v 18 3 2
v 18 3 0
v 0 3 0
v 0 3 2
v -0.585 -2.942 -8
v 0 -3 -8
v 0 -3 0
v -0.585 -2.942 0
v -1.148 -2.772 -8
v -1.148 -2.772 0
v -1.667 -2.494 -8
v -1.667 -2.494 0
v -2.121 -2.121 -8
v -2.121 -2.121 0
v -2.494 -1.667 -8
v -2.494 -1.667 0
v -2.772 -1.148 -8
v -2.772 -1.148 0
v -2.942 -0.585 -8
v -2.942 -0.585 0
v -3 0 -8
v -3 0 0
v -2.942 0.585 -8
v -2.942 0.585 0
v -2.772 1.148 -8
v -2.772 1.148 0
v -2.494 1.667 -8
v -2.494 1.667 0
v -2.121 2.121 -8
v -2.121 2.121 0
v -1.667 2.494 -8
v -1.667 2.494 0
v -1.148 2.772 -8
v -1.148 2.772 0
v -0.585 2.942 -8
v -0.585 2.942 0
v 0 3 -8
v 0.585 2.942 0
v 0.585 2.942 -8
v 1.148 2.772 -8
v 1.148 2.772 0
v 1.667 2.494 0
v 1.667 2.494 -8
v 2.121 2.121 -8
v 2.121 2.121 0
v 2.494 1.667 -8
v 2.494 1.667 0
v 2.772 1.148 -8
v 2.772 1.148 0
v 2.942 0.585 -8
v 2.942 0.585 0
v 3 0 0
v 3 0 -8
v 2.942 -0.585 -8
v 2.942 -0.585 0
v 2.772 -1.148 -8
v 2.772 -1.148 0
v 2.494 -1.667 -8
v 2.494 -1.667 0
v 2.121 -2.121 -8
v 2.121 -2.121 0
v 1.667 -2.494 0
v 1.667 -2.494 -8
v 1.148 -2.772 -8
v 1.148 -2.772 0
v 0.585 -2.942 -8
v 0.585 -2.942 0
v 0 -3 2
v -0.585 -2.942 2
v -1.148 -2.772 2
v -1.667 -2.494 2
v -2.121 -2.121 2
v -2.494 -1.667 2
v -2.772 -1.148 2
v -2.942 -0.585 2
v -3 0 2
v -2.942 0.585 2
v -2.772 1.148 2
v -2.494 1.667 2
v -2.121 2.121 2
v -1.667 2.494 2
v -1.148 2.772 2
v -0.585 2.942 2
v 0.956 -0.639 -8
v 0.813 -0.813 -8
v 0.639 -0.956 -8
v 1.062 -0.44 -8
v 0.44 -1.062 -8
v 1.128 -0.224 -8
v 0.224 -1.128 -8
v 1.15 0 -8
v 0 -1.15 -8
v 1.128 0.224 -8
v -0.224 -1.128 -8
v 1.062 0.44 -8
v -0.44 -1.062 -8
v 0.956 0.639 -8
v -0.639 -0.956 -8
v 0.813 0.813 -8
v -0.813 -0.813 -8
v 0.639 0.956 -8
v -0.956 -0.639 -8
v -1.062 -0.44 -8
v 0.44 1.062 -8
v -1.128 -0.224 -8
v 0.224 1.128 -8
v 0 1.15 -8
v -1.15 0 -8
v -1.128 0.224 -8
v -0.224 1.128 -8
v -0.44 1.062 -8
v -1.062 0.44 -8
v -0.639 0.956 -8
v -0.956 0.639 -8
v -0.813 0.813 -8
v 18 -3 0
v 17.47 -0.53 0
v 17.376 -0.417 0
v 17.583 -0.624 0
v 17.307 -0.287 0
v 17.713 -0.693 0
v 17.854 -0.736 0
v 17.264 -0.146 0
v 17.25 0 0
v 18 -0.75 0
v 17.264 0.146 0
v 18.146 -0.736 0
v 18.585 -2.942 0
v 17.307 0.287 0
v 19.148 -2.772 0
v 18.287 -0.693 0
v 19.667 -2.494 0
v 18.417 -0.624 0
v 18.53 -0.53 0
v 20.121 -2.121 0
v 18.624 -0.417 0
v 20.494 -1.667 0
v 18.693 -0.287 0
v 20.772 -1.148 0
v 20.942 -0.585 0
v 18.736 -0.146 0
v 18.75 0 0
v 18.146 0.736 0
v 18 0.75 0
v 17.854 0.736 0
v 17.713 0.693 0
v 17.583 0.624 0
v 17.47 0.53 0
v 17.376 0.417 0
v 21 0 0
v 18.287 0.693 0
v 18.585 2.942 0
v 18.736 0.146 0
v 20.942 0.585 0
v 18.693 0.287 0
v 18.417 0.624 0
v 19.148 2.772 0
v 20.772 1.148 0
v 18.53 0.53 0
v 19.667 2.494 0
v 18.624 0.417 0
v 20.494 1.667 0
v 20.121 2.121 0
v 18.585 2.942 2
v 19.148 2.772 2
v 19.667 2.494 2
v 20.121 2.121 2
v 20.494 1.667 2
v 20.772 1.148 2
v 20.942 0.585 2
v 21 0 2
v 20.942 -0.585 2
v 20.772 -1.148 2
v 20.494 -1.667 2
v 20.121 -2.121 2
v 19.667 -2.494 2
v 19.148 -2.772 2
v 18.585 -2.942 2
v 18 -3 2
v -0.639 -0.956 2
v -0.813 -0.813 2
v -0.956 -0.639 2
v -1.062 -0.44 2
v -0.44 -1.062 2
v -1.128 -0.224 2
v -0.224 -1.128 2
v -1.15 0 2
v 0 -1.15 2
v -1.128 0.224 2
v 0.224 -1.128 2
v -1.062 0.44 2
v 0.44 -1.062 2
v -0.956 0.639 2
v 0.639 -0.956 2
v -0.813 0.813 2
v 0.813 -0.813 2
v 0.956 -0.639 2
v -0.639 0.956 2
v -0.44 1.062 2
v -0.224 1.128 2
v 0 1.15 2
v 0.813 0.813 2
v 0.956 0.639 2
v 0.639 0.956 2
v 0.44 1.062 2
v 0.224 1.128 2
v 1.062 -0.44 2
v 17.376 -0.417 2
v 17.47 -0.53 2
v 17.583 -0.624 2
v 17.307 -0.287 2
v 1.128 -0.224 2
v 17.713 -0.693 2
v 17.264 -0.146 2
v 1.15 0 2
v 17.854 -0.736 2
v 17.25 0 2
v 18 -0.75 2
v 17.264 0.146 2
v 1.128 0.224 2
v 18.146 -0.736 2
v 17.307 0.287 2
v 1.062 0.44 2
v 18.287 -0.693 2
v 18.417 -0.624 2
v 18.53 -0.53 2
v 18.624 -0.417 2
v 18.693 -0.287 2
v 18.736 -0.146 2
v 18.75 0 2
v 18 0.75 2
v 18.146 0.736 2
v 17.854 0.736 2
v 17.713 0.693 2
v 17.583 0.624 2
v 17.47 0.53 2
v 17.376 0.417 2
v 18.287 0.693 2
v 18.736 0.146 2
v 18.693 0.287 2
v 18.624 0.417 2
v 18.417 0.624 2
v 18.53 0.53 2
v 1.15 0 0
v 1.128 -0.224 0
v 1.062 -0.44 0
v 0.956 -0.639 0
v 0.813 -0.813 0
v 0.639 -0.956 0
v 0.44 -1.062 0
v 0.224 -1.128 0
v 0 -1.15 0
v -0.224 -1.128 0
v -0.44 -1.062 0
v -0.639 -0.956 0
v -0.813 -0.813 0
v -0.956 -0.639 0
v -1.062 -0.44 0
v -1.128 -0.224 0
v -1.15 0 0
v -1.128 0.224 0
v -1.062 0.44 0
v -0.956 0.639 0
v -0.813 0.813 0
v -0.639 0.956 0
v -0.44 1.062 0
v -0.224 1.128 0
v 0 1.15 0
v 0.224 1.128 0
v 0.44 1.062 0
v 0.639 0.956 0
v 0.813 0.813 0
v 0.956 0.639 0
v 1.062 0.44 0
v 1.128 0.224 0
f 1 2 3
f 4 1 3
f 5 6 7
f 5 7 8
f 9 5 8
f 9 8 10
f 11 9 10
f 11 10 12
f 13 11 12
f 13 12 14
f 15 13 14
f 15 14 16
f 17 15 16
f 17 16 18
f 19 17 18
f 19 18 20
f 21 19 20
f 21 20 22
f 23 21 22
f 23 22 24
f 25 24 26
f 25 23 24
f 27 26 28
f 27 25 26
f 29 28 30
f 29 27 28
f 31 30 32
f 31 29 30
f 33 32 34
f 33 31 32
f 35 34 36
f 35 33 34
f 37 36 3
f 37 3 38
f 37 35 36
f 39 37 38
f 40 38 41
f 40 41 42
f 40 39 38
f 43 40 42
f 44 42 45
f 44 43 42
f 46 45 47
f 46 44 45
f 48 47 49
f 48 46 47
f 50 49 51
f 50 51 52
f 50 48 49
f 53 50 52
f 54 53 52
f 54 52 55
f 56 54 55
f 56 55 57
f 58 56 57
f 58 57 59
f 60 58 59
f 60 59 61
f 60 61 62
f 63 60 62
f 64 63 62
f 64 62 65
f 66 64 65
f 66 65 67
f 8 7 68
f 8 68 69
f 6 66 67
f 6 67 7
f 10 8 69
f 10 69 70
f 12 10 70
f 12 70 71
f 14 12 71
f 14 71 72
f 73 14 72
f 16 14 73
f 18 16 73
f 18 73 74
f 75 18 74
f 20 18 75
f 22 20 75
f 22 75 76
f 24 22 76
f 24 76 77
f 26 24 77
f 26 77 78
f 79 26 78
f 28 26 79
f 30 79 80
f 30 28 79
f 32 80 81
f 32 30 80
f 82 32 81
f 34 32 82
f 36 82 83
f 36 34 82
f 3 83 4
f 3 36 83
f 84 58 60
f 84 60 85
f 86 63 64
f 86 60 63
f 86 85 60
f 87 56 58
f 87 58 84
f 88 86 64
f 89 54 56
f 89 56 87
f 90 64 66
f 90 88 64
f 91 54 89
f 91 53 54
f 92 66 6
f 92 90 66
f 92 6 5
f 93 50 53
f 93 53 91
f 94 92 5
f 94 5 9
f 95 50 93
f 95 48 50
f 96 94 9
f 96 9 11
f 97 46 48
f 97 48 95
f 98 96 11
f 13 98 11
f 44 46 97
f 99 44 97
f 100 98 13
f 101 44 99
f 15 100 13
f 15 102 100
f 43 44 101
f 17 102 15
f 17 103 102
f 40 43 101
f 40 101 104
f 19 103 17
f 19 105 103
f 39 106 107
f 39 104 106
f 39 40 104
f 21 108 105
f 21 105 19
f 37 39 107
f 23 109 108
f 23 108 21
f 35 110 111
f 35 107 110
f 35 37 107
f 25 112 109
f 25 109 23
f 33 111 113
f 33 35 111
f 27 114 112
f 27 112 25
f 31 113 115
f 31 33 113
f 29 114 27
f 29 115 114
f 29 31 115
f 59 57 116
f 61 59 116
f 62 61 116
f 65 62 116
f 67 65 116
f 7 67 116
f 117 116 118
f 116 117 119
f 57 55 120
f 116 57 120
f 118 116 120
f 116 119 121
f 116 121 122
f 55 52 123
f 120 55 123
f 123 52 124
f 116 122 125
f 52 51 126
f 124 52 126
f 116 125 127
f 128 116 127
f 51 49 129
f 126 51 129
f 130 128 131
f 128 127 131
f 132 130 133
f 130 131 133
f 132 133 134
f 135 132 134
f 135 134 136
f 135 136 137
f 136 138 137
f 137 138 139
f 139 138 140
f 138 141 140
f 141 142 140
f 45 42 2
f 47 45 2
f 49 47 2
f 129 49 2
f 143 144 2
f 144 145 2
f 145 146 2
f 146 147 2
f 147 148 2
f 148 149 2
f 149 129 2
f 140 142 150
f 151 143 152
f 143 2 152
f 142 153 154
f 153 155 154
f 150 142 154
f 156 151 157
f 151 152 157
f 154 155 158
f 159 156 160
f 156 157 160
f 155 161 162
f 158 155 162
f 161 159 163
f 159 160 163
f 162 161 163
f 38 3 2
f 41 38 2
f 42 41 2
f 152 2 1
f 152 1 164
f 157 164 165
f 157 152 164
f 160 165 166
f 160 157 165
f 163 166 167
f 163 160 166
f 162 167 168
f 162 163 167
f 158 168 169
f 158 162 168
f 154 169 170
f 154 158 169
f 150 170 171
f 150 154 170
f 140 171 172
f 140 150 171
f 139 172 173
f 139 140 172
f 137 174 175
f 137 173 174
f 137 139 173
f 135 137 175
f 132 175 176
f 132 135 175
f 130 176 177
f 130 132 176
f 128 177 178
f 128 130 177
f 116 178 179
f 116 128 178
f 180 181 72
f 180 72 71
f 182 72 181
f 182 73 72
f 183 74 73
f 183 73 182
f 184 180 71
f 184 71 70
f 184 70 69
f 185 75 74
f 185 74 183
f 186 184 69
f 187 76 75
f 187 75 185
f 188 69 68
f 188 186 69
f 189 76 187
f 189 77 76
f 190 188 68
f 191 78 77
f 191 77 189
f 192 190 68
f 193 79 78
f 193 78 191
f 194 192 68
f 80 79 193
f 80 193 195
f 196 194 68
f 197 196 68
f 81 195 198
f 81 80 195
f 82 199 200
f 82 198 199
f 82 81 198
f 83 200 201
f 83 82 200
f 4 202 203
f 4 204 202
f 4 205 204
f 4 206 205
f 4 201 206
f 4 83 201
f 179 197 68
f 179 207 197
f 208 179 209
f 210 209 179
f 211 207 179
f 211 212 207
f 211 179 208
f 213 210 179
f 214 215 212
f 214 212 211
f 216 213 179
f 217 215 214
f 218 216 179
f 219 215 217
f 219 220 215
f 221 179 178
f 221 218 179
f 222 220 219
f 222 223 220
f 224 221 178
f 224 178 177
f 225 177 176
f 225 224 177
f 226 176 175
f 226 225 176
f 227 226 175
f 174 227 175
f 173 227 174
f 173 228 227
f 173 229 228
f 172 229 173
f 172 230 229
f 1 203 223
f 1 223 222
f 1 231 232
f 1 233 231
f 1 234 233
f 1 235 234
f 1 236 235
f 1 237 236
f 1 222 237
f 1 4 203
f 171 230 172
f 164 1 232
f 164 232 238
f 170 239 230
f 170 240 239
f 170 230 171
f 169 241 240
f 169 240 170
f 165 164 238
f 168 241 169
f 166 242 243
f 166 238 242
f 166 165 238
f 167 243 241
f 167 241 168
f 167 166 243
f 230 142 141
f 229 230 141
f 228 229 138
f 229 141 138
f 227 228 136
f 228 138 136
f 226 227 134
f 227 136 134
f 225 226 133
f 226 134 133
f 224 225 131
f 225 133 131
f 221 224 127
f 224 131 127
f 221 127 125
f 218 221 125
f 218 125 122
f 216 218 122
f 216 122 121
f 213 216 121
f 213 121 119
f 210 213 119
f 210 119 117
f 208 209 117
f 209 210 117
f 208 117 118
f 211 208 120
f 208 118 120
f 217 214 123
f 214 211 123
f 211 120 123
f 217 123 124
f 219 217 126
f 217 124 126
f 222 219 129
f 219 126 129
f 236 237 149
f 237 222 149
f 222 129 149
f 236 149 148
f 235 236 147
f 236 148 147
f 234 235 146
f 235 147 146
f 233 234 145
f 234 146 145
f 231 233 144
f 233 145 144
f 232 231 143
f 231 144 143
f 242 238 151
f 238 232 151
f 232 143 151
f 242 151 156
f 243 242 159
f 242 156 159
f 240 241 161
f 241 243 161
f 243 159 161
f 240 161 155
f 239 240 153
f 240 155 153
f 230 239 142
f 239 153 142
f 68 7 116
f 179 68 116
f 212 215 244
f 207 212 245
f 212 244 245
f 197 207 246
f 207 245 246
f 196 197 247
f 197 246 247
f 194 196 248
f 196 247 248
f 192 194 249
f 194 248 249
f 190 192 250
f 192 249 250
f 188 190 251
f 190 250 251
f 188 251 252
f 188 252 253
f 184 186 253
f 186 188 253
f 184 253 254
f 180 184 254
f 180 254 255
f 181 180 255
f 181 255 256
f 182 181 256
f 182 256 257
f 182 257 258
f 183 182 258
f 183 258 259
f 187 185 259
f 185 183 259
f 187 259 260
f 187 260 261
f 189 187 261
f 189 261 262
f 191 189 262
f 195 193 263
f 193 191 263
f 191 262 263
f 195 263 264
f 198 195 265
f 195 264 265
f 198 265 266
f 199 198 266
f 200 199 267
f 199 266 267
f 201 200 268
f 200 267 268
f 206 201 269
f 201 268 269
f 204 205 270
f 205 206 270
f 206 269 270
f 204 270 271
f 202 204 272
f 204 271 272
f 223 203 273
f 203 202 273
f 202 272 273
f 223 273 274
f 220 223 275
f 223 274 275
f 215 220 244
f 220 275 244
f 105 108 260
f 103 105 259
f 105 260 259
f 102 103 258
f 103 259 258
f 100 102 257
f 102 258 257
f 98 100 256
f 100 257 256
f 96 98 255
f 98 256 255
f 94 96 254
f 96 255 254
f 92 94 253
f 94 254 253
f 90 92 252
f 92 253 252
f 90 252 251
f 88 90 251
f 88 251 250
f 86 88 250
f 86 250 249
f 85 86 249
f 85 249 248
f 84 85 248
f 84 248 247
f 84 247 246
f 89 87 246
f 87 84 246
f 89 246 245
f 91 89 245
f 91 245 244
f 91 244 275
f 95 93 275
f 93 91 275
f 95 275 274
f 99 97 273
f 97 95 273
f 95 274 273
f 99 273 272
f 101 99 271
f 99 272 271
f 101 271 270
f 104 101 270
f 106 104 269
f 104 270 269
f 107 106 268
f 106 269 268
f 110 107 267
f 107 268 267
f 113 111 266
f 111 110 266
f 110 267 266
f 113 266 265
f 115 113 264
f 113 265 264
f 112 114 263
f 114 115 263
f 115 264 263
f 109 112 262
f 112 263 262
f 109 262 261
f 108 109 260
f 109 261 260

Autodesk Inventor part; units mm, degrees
ref_plane "YZ Plane" through (0, 0, 0) normal (1, 0, 0) x (0, 1, 0)
ref_plane "XZ Plane" through (0, 0, 0) normal (0, 1, 0) x (-1, 0, 0)
ref_plane "XY Plane" through (0, 0, 0) normal (0, 0, 1) x (1, 0, 0)
sketch "Sketch1" plane through (0, 0, 0) normal (0, 0, 1) x (1, 0, 0)
  circle A0 centre (0, 0) radius 1.15
  line L0 (0, 0) -> (18, 0) construction
  line L1 (0, -3) -> (18, -3)
  line L2 (18, 3) -> (0, 3)
  arc A1 (0, 3) -> (0, -3) centre (0, 0) ccw
  arc A2 (18, -3) -> (18, 3) centre (18, 0) ccw
  circle A3 centre (18, 0) radius 0.75
  point P0 (9, 0)
  dimension "d0" = 2.3
  dimension "d1" = 3
  dimension "d2" = 1.5
  dimension "d3" = 18
extrude "Extrusion1" add sketch "Sketch1" along normal blind 2
sketch "Sketch2" plane through (0, 0, 0) normal (0, 0, -1) x (-1, 0, 0)
  arc A0 (0, -3) -> (0, 3) centre (0, 0) ccw projected
  circle A1 centre (0, 0) radius 3
  circle A2 centre (0, 0) radius 1.15
  circle A3 centre (0, 0) radius 1.15 projected
  point P0 (0, -3)
extrude "Extrusion2" add sketch "Sketch2" along normal blind 8
properties part number "ServoArm"
